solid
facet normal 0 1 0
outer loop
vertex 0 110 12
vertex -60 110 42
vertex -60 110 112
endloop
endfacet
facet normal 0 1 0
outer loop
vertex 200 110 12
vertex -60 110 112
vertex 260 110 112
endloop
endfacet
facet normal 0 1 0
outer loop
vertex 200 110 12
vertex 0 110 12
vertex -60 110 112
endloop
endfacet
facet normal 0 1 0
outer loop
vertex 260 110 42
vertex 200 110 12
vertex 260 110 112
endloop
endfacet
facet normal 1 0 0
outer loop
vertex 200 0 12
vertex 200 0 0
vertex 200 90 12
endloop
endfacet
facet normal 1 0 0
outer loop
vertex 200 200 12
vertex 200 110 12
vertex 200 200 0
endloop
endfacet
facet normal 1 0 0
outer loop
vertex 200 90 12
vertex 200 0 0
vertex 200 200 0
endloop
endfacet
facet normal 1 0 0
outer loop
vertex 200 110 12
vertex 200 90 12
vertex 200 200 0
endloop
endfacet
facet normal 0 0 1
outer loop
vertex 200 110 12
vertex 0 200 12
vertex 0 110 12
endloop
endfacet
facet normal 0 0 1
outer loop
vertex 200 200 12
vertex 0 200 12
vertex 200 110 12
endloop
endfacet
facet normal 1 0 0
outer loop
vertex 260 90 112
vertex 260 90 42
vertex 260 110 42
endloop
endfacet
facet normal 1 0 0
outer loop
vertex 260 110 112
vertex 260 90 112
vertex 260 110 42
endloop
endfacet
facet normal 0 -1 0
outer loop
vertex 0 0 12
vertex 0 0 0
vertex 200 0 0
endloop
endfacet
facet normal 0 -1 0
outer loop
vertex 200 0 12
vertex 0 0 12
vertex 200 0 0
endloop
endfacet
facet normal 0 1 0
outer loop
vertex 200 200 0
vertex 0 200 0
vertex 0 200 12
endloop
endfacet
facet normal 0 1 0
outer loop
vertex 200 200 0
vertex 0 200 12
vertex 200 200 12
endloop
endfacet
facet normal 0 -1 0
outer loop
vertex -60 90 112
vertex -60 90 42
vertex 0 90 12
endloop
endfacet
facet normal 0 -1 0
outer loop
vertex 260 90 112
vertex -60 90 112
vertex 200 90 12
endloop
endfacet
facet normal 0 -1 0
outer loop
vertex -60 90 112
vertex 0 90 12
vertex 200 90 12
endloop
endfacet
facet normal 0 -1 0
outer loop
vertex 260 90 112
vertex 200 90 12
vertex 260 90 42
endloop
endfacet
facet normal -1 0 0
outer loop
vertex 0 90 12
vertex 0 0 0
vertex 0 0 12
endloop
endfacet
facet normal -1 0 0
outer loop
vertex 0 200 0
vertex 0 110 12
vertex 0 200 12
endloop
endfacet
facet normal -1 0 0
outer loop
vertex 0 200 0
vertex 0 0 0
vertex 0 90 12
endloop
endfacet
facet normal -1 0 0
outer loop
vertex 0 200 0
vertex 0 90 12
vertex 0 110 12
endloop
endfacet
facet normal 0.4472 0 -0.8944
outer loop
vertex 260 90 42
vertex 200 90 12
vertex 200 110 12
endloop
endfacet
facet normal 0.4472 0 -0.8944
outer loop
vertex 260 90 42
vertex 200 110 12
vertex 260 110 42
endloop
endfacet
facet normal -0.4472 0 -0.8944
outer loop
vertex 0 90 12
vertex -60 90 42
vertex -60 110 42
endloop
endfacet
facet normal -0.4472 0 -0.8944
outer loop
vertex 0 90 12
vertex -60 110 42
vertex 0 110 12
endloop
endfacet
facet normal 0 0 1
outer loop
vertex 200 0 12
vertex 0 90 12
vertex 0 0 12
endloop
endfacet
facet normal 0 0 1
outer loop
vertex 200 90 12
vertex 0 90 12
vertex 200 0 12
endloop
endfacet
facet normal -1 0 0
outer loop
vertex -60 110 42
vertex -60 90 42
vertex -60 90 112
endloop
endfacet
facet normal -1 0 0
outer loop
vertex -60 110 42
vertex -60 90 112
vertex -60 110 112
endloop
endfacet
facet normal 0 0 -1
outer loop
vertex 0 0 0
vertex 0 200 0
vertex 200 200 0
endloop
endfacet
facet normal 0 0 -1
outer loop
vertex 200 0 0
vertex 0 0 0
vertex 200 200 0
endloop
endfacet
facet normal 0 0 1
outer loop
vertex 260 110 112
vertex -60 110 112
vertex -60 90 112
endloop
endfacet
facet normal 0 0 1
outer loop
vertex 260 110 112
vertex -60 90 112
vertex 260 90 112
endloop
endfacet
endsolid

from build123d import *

# Parameters (mm, degrees)
SKETCH_1_W          = 200
SKETCH_1_H          = 200
EXTRUDE_1_DEPTH     = 12
SKETCH_3_W          = 320
SKETCH_3_H          = 20
EXTRUDE_3_DEPTH     = 100
CUT_EXTRUDE_4_DEPTH = 304.716973513


with BuildPart() as part:
    # 草图1 → 拉伸1 (new body)
    with BuildSketch(Plane.XY):
        with Locations((100, 100)):
            Rectangle(SKETCH_1_W, SKETCH_1_H)
    extrude(amount=EXTRUDE_1_DEPTH)

    # 草图3 → 拉伸3 (add)
    with BuildSketch(Plane.XY.offset(12)):
        with Locations((100, 100)):
            Rectangle(SKETCH_3_W, SKETCH_3_H)
    extrude(amount=EXTRUDE_3_DEPTH)

    # 草图4 → 拉伸4 (cut, through all)
    with BuildSketch(Plane.XZ.offset(-90)):
        Polygon((200, 12), (260, 42), (260, 12), align=None)
        Polygon((-60, 42), (0, 12), (-60, 12), align=None)
    extrude(amount=-CUT_EXTRUDE_4_DEPTH, mode=Mode.SUBTRACT)


solid = part.part
